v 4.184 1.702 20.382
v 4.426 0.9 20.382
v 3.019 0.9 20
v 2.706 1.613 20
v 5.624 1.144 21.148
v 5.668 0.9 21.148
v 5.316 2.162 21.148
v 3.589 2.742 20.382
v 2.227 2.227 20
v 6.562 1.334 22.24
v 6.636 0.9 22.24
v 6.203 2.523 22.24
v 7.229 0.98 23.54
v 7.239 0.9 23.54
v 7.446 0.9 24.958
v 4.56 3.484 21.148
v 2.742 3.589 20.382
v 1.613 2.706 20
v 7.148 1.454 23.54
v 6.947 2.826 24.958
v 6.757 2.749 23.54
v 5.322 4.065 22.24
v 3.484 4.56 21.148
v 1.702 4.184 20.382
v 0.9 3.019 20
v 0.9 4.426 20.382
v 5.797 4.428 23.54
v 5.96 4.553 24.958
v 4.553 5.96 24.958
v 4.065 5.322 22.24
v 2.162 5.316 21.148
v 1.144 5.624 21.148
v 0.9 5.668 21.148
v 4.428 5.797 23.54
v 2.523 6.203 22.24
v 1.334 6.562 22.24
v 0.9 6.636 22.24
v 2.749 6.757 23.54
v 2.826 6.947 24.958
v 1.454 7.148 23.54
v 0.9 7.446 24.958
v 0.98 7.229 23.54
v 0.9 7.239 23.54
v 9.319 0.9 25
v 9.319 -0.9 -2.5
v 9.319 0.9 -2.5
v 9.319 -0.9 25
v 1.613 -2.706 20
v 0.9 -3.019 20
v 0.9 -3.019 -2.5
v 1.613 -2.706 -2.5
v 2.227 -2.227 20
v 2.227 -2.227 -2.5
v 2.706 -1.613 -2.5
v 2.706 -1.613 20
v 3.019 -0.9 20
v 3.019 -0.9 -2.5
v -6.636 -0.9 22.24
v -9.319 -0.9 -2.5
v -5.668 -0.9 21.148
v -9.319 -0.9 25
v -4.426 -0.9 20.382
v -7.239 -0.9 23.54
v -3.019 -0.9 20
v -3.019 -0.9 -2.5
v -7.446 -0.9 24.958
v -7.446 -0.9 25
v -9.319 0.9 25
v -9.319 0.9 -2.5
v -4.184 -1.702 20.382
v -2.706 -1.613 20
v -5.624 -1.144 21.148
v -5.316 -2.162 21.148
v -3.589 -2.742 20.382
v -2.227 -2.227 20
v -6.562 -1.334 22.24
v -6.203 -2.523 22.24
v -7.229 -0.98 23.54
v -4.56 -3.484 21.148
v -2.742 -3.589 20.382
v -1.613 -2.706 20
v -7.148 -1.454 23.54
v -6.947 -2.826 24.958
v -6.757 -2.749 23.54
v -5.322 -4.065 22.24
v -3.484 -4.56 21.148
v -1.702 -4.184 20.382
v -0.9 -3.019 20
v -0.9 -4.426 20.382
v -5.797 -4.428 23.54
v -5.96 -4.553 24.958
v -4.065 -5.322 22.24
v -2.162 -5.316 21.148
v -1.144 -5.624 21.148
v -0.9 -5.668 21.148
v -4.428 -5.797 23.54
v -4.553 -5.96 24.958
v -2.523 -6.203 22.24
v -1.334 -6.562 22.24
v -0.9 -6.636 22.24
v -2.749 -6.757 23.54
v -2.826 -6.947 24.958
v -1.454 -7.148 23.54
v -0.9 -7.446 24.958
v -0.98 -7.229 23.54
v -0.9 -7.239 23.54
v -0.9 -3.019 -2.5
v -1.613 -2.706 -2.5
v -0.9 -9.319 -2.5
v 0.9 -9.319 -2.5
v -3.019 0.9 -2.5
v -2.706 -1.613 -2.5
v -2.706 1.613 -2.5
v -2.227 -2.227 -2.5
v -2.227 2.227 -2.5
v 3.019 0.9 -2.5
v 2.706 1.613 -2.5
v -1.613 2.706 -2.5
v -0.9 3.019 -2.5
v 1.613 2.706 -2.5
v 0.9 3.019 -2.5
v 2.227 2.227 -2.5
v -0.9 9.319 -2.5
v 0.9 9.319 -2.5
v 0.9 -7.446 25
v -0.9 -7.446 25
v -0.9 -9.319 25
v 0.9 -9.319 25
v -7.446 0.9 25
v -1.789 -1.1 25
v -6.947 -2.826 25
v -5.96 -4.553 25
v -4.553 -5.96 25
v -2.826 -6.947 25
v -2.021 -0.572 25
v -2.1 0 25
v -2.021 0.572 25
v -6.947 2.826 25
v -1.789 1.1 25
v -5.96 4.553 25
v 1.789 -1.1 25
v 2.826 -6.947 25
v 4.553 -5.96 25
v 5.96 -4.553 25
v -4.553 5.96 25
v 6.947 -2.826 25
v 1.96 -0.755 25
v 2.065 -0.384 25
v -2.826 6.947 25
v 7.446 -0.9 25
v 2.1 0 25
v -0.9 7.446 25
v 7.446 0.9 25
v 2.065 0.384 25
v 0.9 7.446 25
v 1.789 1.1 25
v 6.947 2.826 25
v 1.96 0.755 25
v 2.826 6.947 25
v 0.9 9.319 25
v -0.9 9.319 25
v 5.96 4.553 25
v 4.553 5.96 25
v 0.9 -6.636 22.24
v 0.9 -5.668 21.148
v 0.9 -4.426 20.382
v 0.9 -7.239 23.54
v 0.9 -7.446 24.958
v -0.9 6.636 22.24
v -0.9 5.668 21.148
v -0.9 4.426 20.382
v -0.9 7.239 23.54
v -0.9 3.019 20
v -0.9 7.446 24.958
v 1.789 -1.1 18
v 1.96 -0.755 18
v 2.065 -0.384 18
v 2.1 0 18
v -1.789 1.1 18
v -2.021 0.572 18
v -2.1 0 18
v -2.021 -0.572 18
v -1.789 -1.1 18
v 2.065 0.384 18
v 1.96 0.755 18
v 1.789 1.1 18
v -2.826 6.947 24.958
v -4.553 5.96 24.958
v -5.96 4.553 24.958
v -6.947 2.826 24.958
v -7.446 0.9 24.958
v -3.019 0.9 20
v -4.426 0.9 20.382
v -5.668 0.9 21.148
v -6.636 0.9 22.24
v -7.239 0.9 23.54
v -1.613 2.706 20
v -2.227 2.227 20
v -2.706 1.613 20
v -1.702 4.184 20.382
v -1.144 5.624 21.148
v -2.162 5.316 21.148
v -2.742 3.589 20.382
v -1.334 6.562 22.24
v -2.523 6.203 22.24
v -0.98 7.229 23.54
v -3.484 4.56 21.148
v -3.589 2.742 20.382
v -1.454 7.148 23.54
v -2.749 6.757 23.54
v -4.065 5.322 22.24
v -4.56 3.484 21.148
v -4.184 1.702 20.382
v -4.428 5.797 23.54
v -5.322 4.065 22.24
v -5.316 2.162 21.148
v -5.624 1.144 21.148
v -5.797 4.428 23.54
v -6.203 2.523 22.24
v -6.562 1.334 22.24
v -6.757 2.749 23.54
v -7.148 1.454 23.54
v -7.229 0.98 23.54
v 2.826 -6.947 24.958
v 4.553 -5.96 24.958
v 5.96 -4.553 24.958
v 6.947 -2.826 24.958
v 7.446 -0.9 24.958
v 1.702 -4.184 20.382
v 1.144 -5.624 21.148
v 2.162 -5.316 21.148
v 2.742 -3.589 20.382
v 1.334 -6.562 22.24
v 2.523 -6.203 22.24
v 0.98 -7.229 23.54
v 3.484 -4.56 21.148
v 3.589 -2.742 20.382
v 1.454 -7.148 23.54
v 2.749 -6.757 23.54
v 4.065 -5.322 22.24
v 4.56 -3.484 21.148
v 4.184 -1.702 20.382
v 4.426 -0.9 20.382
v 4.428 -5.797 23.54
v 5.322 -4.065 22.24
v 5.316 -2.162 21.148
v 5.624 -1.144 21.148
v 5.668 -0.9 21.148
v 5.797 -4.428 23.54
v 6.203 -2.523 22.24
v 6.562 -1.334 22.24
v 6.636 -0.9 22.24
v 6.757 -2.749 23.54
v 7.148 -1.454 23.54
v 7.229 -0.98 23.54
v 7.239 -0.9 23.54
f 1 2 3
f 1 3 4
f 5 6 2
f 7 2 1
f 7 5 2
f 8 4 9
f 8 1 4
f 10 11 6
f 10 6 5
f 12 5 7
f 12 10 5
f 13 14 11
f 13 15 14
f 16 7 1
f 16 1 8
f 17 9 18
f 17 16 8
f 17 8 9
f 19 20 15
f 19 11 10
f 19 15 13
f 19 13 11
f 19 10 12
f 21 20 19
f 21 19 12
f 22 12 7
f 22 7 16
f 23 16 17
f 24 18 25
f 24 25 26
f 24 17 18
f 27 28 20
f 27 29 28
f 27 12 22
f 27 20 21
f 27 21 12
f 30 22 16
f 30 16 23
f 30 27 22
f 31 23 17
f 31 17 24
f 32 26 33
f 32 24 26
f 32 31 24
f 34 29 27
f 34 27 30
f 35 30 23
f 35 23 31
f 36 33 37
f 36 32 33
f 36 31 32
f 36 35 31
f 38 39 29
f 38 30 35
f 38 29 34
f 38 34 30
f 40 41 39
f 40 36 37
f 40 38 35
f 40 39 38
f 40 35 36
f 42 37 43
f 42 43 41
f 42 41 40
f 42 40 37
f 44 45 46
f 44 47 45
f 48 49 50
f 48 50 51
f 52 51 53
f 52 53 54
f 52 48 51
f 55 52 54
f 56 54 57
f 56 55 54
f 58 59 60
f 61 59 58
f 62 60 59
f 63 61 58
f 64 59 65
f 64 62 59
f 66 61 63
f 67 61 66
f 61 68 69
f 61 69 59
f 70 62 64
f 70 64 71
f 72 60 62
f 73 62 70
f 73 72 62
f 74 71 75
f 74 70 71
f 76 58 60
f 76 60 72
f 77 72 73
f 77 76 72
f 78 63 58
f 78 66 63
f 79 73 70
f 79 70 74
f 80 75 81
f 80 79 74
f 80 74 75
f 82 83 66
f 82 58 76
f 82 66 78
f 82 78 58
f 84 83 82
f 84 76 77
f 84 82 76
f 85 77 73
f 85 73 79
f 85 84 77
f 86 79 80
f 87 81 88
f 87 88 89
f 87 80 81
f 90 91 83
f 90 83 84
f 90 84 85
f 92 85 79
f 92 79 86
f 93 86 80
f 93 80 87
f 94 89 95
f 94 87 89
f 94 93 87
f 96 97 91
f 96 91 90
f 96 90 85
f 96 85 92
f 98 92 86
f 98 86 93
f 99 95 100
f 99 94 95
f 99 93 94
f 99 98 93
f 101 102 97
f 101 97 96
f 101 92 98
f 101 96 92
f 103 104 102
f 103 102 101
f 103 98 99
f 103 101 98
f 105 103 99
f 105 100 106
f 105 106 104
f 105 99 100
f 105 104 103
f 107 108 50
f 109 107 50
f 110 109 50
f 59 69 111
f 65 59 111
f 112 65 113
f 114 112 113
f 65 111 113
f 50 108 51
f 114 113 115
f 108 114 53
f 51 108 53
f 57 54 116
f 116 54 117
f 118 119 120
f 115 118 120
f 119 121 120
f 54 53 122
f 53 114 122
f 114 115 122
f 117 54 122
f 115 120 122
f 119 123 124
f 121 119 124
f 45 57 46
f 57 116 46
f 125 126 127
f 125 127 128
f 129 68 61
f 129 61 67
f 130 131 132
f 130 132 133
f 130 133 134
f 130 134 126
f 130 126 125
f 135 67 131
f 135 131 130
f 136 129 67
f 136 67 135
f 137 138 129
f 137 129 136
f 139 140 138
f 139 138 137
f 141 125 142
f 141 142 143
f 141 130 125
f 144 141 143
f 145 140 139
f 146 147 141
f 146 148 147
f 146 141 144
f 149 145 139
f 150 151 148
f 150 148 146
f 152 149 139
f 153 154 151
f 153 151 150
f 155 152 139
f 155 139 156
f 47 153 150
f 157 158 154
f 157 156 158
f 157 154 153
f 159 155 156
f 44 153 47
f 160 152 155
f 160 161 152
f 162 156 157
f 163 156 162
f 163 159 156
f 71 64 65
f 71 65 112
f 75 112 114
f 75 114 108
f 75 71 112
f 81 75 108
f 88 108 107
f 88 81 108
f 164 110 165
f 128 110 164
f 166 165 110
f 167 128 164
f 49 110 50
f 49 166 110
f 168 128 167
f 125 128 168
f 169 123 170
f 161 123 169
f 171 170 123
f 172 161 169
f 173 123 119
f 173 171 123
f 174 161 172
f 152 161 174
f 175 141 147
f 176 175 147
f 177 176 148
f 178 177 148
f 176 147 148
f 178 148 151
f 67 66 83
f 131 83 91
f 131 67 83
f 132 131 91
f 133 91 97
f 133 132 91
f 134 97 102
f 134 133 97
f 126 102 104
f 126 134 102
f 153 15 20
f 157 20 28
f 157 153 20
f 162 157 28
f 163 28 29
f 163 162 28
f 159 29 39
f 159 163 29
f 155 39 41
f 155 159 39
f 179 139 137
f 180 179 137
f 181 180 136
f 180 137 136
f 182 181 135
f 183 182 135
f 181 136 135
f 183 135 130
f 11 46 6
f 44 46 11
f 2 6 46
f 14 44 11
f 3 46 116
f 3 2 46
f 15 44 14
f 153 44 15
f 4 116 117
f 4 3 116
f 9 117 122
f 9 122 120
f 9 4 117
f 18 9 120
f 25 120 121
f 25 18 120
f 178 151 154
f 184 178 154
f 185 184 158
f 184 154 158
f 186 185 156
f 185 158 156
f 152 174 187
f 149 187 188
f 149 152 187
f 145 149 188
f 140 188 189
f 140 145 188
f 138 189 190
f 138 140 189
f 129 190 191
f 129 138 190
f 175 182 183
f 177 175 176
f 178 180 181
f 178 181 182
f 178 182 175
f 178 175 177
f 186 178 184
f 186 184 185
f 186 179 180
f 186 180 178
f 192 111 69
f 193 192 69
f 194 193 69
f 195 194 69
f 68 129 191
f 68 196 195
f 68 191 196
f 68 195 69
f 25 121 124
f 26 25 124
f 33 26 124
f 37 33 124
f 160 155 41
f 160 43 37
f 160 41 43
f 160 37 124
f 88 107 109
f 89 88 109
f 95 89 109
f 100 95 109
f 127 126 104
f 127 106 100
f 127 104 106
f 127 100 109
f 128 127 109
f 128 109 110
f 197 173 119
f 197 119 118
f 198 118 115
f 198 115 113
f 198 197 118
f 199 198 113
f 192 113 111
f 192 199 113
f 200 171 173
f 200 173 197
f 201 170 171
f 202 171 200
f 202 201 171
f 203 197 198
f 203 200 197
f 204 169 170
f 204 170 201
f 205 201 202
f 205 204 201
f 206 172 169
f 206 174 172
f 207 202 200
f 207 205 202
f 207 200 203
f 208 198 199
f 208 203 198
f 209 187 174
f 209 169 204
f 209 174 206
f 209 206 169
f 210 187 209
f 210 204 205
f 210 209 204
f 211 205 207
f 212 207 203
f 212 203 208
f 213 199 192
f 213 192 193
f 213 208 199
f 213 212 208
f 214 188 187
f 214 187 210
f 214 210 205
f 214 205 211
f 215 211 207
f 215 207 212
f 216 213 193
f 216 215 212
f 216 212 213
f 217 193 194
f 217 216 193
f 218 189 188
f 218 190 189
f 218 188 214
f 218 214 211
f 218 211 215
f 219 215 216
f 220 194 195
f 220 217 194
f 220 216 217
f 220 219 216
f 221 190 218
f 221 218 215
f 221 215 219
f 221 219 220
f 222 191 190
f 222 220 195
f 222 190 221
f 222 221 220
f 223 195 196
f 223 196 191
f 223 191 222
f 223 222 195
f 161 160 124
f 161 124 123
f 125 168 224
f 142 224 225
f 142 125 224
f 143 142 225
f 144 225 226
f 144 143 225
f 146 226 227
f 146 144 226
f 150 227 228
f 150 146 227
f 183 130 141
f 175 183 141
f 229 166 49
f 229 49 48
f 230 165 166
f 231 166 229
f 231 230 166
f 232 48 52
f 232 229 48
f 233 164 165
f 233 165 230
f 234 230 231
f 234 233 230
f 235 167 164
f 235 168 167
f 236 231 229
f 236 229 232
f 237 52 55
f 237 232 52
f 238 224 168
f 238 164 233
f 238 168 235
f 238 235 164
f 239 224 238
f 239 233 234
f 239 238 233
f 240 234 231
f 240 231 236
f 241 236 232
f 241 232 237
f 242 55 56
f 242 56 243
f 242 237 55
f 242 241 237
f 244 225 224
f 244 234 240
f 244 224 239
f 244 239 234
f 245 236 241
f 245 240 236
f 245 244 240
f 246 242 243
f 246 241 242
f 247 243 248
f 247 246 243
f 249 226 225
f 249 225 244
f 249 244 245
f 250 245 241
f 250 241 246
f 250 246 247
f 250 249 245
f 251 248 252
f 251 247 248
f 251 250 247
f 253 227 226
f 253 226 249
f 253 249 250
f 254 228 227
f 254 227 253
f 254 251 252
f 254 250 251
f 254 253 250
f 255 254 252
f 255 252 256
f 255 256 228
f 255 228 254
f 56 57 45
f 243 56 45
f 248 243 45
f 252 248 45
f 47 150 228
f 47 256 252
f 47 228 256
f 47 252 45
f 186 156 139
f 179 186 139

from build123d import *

# Parameters (mm, degrees)
F1_DEPTH     = 25
F3_DEPTH     = 7
F6_DEPTH     = 5
F7_DEPTH     = 2.5
F8_T4_ANGLE  = 265.6355670682
F8_T10_ANGLE = 265.6355670682
F8_T16_ANGLE = 265.6355670682
F8_T22_ANGLE = 265.6355670682
F8_T28_ANGLE = 265.6355670682
F8_T34_ANGLE = 265.6355670682
F8_T40_ANGLE = 265.6355670681
F8_T46_ANGLE = 265.6355670681
F8_T52_ANGLE = 265.6355670681
F8_T58_ANGLE = 265.6355670682
F8_T64_ANGLE = 265.6355670682
F8_T70_ANGLE = 265.6355670682


# Not quite as in the source:
# - a fillet or chamfer that OpenCascade refuses, or shapes differently, is made with other operations: its cross-section is extruded or revolved along the edge and cut away or added


with BuildPart() as f1:
    # F0 (on Top) → F1 (new body)
    with BuildSketch(Plane.XY):
        with BuildLine():
            ThreePointArc((3.0186917696, -0.9), (3.1170000862, -0.4547641838), (3.15, 0))
            ThreePointArc((3.15, 0), (3.1170000862, 0.4547641838), (3.0186917696, 0.9))
            ThreePointArc((3.0186917696, 0.9), (2.2273863607, 2.2273863607), (0.9, 3.0186917696))
            ThreePointArc((0.9, 3.0186917696), (0, 3.15), (-0.9, 3.0186917696))
            ThreePointArc((-0.9, 3.0186917696), (-2.2273863607, 2.2273863607), (-3.0186917696, 0.9))
            ThreePointArc((-3.0186917696, 0.9), (-3.15, 0), (-3.0186917696, -0.9))
            ThreePointArc((-3.0186917696, -0.9), (-2.2273863607, -2.2273863607), (-0.9, -3.0186917696))
            ThreePointArc((-0.9, -3.0186917696), (0, -3.15), (0.9, -3.0186917696))
            ThreePointArc((0.9, -3.0186917696), (2.2273863607, -2.2273863607), (3.0186917696, -0.9))
        make_face()
        with BuildLine():
            ThreePointArc((3.0186917696, 0.9), (3.1170000862, 0.4547641838), (3.15, 0))
            ThreePointArc((3.15, 0), (3.1170000862, -0.4547641838), (3.0186917696, -0.9))
            Line((3.0186917696, -0.9), (9.3186917696, -0.9))
            Line((9.3186917696, -0.9), (9.3186917696, 0.9))
            Line((9.3186917696, 0.9), (3.0186917696, 0.9))
        make_face()
        with BuildLine():
            ThreePointArc((-0.9, 3.0186917696), (0, 3.15), (0.9, 3.0186917696))
            Line((0.9, 3.0186917696), (0.9, 9.3186917696))
            Line((0.9, 9.3186917696), (-0.9, 9.3186917696))
            Line((-0.9, 9.3186917696), (-0.9, 3.0186917696))
        make_face()
        with BuildLine():
            Line((0.9, -9.3186917696), (0.9, -3.0186917696))
            ThreePointArc((0.9, -3.0186917696), (0, -3.15), (-0.9, -3.0186917696))
            Line((-0.9, -3.0186917696), (-0.9, -9.3186917696))
            Line((-0.9, -9.3186917696), (0.9, -9.3186917696))
        make_face()
        with BuildLine():
            ThreePointArc((-3.0186917696, -0.9), (-3.15, 0), (-3.0186917696, 0.9))
            Line((-3.0186917696, 0.9), (-9.3186917696, 0.9))
            Line((-9.3186917696, 0.9), (-9.3186917696, -0.9))
            Line((-9.3186917696, -0.9), (-3.0186917696, -0.9))
        make_face()
    extrude(amount=F1_DEPTH)

    # F2 (on face) → F3 (cut)
    with BuildSketch(Plane.XY.offset(25)):
        with BuildLine():
            ThreePointArc((1.788854382, -1.1), (2.020716977, -0.5715793024), (2.1, 0))
            ThreePointArc((2.1, 0), (2.020716977, 0.5715793024), (1.788854382, 1.1))
            Line((1.788854382, 1.1), (-1.788854382, 1.1))
            ThreePointArc((-1.788854382, 1.1), (-2.1, 0), (-1.788854382, -1.1))
            Line((-1.788854382, -1.1), (1.788854382, -1.1))
        make_face()
    extrude(amount=-F3_DEPTH, mode=Mode.SUBTRACT)

    # F5 (on face) → F6 (join)
    with BuildSketch(Plane.XY.offset(25)):
        with BuildLine():
            Line((-0.9, 3.0186917696), (-0.9, 7.4458041876))
            ThreePointArc((-0.9, 7.4458041876), (-5.3033008589, 5.3033008589), (-7.4458041876, 0.9))
            Line((-7.4458041876, 0.9), (-3.0186917696, 0.9))
            ThreePointArc((-3.0186917696, 0.9), (-2.2273863607, 2.2273863607), (-0.9, 3.0186917696))
        make_face()
        with BuildLine():
            ThreePointArc((-7.4458041876, -0.9), (-5.3033008589, -5.3033008589), (-0.9, -7.4458041876))
            Line((-0.9, -7.4458041876), (-0.9, -3.0186917696))
            ThreePointArc((-0.9, -3.0186917696), (-2.2273863607, -2.2273863607), (-3.0186917696, -0.9))
            Line((-3.0186917696, -0.9), (-7.4458041876, -0.9))
        make_face()
        with BuildLine():
            ThreePointArc((0.9, -7.4458041876), (5.3033008589, -5.3033008589), (7.4458041876, -0.9))
            Line((7.4458041876, -0.9), (3.0186917696, -0.9))
            ThreePointArc((3.0186917696, -0.9), (2.2273863607, -2.2273863607), (0.9, -3.0186917696))
            Line((0.9, -3.0186917696), (0.9, -7.4458041876))
        make_face()
        with BuildLine():
            Line((3.0186917696, 0.9), (7.4458041876, 0.9))
            ThreePointArc((7.4458041876, 0.9), (5.3033008589, 5.3033008589), (0.9, 7.4458041876))
            Line((0.9, 7.4458041876), (0.9, 3.0186917696))
            ThreePointArc((0.9, 3.0186917696), (2.2273863607, 2.2273863607), (3.0186917696, 0.9))
        make_face()
    extrude(amount=-F6_DEPTH)

    # F7 (add): a face of the model
    f7_faces = [f1.faces().sort_by_distance(p)[0] for p in [
        (0, 0, 0),
    ]]
    extrude(f7_faces, amount=F7_DEPTH)

    # F8: fillet of radius 5 on 4 edges, made by hand


with BuildPart() as f8_tool2:
    # F8_s3 → F8_t4 (revolve)
    with BuildSketch(Plane(origin=(0, 0, 0), x_dir=(0, 0, 1), z_dir=(0.0380776548, -0.9992747831, 0))):
        with BuildLine():
            ThreePointArc((20, -3.15), (21.6598434797, -6.2583240946), (24.9575699692, -7.5))
            Line((24.9575699692, -7.5), (20, -7.5))
            Line((20, -7.5), (20, -3.15))
        make_face()
    revolve(axis=Axis((0, 0, 20), (0, 0, 1)), revolution_arc=F8_T4_ANGLE)

    split(bisect_by=Plane.XZ.offset(-0.9), keep=Keep.BOTTOM)

    split(bisect_by=Plane.YZ.offset(0.9), keep=Keep.TOP)


with BuildPart() as f1_1:
    add(f1.part)

    # F8_t1: cut F8_tool2
    add(f8_tool2.part, mode=Mode.SUBTRACT)


with BuildPart() as f8_tool8:
    # F8_s9 → F8_t10 (revolve)
    with BuildSketch(Plane(origin=(0, 0, 0), x_dir=(0, 0, 1), z_dir=(0.0380776548, -0.9992747831, 0))):
        with BuildLine():
            ThreePointArc((20, -3.15), (21.6598434797, -6.2583240946), (24.9575699692, -7.5))
            Line((24.9575699692, -7.5), (20, -7.5))
            Line((20, -7.5), (20, -3.15))
        make_face()
    revolve(axis=Axis((0, 0, 20), (0, 0, 1)), revolution_arc=F8_T10_ANGLE)

    split(bisect_by=Plane.YZ.offset(-0.9), keep=Keep.BOTTOM)

    split(bisect_by=Plane.XZ.offset(-0.9), keep=Keep.BOTTOM)


with BuildPart() as f1_2:
    add(f1_1.part)

    # F8_t7: cut F8_tool8
    add(f8_tool8.part, mode=Mode.SUBTRACT)


with BuildPart() as f8_tool14:
    # F8_s15 → F8_t16 (revolve)
    with BuildSketch(Plane(origin=(0, 0, 0), x_dir=(0, 0, 1), z_dir=(0.0380776548, -0.9992747831, 0))):
        with BuildLine():
            ThreePointArc((20, -3.15), (21.6598434797, -6.2583240946), (24.9575699692, -7.5))
            Line((24.9575699692, -7.5), (20, -7.5))
            Line((20, -7.5), (20, -3.15))
        make_face()
    revolve(axis=Axis((0, 0, 20), (0, 0, 1)), revolution_arc=F8_T16_ANGLE)

    split(bisect_by=Plane.YZ.offset(-0.9), keep=Keep.BOTTOM)

    split(bisect_by=Plane.XZ.offset(0.9), keep=Keep.TOP)


with BuildPart() as f1_3:
    add(f1_2.part)

    # F8_t13: cut F8_tool14
    add(f8_tool14.part, mode=Mode.SUBTRACT)


with BuildPart() as f8_tool20:
    # F8_s21 → F8_t22 (revolve)
    with BuildSketch(Plane(origin=(0, 0, 0), x_dir=(0, 0, 1), z_dir=(-0.9992747831, -0.0380776548, 0))):
        with BuildLine():
            ThreePointArc((20, -3.15), (21.6598434797, -6.2583240946), (24.9575699692, -7.5))
            Line((24.9575699692, -7.5), (20, -7.5))
            Line((20, -7.5), (20, -3.15))
        make_face()
    revolve(axis=Axis((0, 0, 20), (0, 0, 1)), revolution_arc=F8_T22_ANGLE)

    split(bisect_by=Plane.XZ.offset(0.9), keep=Keep.TOP)

    split(bisect_by=Plane.YZ.offset(0.9), keep=Keep.TOP)


with BuildPart() as f1_4:
    add(f1_3.part)

    # F8_t19: cut F8_tool20
    add(f8_tool20.part, mode=Mode.SUBTRACT)


with BuildPart() as f8_tool26:
    # F8_s27 → F8_t28 (revolve)
    with BuildSketch(Plane(origin=(0, 0, 0), x_dir=(0, 0, 1), z_dir=(-0.9992747831, -0.0380776548, 0))):
        with BuildLine():
            ThreePointArc((20, -3.15), (21.6598434797, -6.2583240946), (24.9575699692, -7.5))
            Line((24.9575699692, -7.5), (20, -7.5))
            Line((20, -7.5), (20, -3.15))
        make_face()
    revolve(axis=Axis((0, 0, 20), (0, 0, 1)), revolution_arc=F8_T28_ANGLE)

    split(bisect_by=Plane.YZ.offset(0.9), keep=Keep.TOP)

    split(bisect_by=Plane.XZ.offset(-0.9), keep=Keep.BOTTOM)


with BuildPart() as f1_5:
    add(f1_4.part)

    # F8_t25: cut F8_tool26
    add(f8_tool26.part, mode=Mode.SUBTRACT)


with BuildPart() as f8_tool32:
    # F8_s33 → F8_t34 (revolve)
    with BuildSketch(Plane(origin=(0, 0, 0), x_dir=(0, 0, 1), z_dir=(-0.9992747831, -0.0380776548, 0))):
        with BuildLine():
            ThreePointArc((20, -3.15), (21.6598434797, -6.2583240946), (24.9575699692, -7.5))
            Line((24.9575699692, -7.5), (20, -7.5))
            Line((20, -7.5), (20, -3.15))
        make_face()
    revolve(axis=Axis((0, 0, 20), (0, 0, 1)), revolution_arc=F8_T34_ANGLE)

    split(bisect_by=Plane.XZ.offset(-0.9), keep=Keep.BOTTOM)

    split(bisect_by=Plane.YZ.offset(-0.9), keep=Keep.BOTTOM)


with BuildPart() as f1_6:
    add(f1_5.part)

    # F8_t31: cut F8_tool32
    add(f8_tool32.part, mode=Mode.SUBTRACT)


with BuildPart() as f8_tool38:
    # F8_s39 → F8_t40 (revolve)
    with BuildSketch(Plane(origin=(0, 0, 0), x_dir=(0, 0, 1), z_dir=(0.9992747831, 0.0380776548, 0))):
        with BuildLine():
            ThreePointArc((20, -3.15), (21.6598434797, -6.2583240946), (24.9575699692, -7.5))
            Line((24.9575699692, -7.5), (20, -7.5))
            Line((20, -7.5), (20, -3.15))
        make_face()
    revolve(axis=Axis((0, 0, 20), (0, 0, 1)), revolution_arc=F8_T40_ANGLE)

    split(bisect_by=Plane.YZ.offset(-0.9), keep=Keep.BOTTOM)

    split(bisect_by=Plane.XZ.offset(-0.9), keep=Keep.BOTTOM)


with BuildPart() as f1_7:
    add(f1_6.part)

    # F8_t37: cut F8_tool38
    add(f8_tool38.part, mode=Mode.SUBTRACT)


with BuildPart() as f8_tool44:
    # F8_s45 → F8_t46 (revolve)
    with BuildSketch(Plane(origin=(0, 0, 0), x_dir=(0, 0, 1), z_dir=(0.9992747831, 0.0380776548, 0))):
        with BuildLine():
            ThreePointArc((20, -3.15), (21.6598434797, -6.2583240946), (24.9575699692, -7.5))
            Line((24.9575699692, -7.5), (20, -7.5))
            Line((20, -7.5), (20, -3.15))
        make_face()
    revolve(axis=Axis((0, 0, 20), (0, 0, 1)), revolution_arc=F8_T46_ANGLE)

    split(bisect_by=Plane.XZ.offset(0.9), keep=Keep.TOP)

    split(bisect_by=Plane.YZ.offset(-0.9), keep=Keep.BOTTOM)


with BuildPart() as f1_8:
    add(f1_7.part)

    # F8_t43: cut F8_tool44
    add(f8_tool44.part, mode=Mode.SUBTRACT)


with BuildPart() as f8_tool50:
    # F8_s51 → F8_t52 (revolve)
    with BuildSketch(Plane(origin=(0, 0, 0), x_dir=(0, 0, 1), z_dir=(0.9992747831, 0.0380776548, 0))):
        with BuildLine():
            ThreePointArc((20, -3.15), (21.6598434797, -6.2583240946), (24.9575699692, -7.5))
            Line((24.9575699692, -7.5), (20, -7.5))
            Line((20, -7.5), (20, -3.15))
        make_face()
    revolve(axis=Axis((0, 0, 20), (0, 0, 1)), revolution_arc=F8_T52_ANGLE)

    split(bisect_by=Plane.XZ.offset(0.9), keep=Keep.TOP)

    split(bisect_by=Plane.YZ.offset(0.9), keep=Keep.TOP)


with BuildPart() as f1_9:
    add(f1_8.part)

    # F8_t49: cut F8_tool50
    add(f8_tool50.part, mode=Mode.SUBTRACT)


with BuildPart() as f8_tool56:
    # F8_s57 → F8_t58 (revolve)
    with BuildSketch(Plane(origin=(0, 0, 0), x_dir=(0, 0, 1), z_dir=(-0.0380776548, 0.9992747831, 0))):
        with BuildLine():
            ThreePointArc((24.9575699692, -7.5), (21.6598434797, -6.2583240946), (20, -3.15))
            Line((20, -3.15), (20, -7.5))
            Line((20, -7.5), (24.9575699692, -7.5))
        make_face()
    revolve(axis=Axis((0, 0, 20), (0, 0, 1)), revolution_arc=F8_T58_ANGLE)

    split(bisect_by=Plane.XZ.offset(0.9), keep=Keep.TOP)

    split(bisect_by=Plane.YZ.offset(-0.9), keep=Keep.BOTTOM)


with BuildPart() as f1_10:
    add(f1_9.part)

    # F8_t55: cut F8_tool56
    add(f8_tool56.part, mode=Mode.SUBTRACT)


with BuildPart() as f8_tool62:
    # F8_s63 → F8_t64 (revolve)
    with BuildSketch(Plane(origin=(0, 0, 0), x_dir=(0, 0, 1), z_dir=(-0.0380776548, 0.9992747831, 0))):
        with BuildLine():
            ThreePointArc((24.9575699692, -7.5), (21.6598434797, -6.2583240946), (20, -3.15))
            Line((20, -3.15), (20, -7.5))
            Line((20, -7.5), (24.9575699692, -7.5))
        make_face()
    revolve(axis=Axis((0, 0, 20), (0, 0, 1)), revolution_arc=F8_T64_ANGLE)

    split(bisect_by=Plane.XZ.offset(0.9), keep=Keep.TOP)

    split(bisect_by=Plane.YZ.offset(0.9), keep=Keep.TOP)


with BuildPart() as f1_11:
    add(f1_10.part)

    # F8_t61: cut F8_tool62
    add(f8_tool62.part, mode=Mode.SUBTRACT)


with BuildPart() as f8_tool68:
    # F8_s69 → F8_t70 (revolve)
    with BuildSketch(Plane(origin=(0, 0, 0), x_dir=(0, 0, 1), z_dir=(-0.0380776548, 0.9992747831, 0))):
        with BuildLine():
            ThreePointArc((24.9575699692, -7.5), (21.6598434797, -6.2583240946), (20, -3.15))
            Line((20, -3.15), (20, -7.5))
            Line((20, -7.5), (24.9575699692, -7.5))
        make_face()
    revolve(axis=Axis((0, 0, 20), (0, 0, 1)), revolution_arc=F8_T70_ANGLE)

    split(bisect_by=Plane.YZ.offset(0.9), keep=Keep.TOP)

    split(bisect_by=Plane.XZ.offset(-0.9), keep=Keep.BOTTOM)


with BuildPart() as f1_12:
    add(f1_11.part)

    # F8_t67: cut F8_tool68
    add(f8_tool68.part, mode=Mode.SUBTRACT)


solid = f1_12.part
